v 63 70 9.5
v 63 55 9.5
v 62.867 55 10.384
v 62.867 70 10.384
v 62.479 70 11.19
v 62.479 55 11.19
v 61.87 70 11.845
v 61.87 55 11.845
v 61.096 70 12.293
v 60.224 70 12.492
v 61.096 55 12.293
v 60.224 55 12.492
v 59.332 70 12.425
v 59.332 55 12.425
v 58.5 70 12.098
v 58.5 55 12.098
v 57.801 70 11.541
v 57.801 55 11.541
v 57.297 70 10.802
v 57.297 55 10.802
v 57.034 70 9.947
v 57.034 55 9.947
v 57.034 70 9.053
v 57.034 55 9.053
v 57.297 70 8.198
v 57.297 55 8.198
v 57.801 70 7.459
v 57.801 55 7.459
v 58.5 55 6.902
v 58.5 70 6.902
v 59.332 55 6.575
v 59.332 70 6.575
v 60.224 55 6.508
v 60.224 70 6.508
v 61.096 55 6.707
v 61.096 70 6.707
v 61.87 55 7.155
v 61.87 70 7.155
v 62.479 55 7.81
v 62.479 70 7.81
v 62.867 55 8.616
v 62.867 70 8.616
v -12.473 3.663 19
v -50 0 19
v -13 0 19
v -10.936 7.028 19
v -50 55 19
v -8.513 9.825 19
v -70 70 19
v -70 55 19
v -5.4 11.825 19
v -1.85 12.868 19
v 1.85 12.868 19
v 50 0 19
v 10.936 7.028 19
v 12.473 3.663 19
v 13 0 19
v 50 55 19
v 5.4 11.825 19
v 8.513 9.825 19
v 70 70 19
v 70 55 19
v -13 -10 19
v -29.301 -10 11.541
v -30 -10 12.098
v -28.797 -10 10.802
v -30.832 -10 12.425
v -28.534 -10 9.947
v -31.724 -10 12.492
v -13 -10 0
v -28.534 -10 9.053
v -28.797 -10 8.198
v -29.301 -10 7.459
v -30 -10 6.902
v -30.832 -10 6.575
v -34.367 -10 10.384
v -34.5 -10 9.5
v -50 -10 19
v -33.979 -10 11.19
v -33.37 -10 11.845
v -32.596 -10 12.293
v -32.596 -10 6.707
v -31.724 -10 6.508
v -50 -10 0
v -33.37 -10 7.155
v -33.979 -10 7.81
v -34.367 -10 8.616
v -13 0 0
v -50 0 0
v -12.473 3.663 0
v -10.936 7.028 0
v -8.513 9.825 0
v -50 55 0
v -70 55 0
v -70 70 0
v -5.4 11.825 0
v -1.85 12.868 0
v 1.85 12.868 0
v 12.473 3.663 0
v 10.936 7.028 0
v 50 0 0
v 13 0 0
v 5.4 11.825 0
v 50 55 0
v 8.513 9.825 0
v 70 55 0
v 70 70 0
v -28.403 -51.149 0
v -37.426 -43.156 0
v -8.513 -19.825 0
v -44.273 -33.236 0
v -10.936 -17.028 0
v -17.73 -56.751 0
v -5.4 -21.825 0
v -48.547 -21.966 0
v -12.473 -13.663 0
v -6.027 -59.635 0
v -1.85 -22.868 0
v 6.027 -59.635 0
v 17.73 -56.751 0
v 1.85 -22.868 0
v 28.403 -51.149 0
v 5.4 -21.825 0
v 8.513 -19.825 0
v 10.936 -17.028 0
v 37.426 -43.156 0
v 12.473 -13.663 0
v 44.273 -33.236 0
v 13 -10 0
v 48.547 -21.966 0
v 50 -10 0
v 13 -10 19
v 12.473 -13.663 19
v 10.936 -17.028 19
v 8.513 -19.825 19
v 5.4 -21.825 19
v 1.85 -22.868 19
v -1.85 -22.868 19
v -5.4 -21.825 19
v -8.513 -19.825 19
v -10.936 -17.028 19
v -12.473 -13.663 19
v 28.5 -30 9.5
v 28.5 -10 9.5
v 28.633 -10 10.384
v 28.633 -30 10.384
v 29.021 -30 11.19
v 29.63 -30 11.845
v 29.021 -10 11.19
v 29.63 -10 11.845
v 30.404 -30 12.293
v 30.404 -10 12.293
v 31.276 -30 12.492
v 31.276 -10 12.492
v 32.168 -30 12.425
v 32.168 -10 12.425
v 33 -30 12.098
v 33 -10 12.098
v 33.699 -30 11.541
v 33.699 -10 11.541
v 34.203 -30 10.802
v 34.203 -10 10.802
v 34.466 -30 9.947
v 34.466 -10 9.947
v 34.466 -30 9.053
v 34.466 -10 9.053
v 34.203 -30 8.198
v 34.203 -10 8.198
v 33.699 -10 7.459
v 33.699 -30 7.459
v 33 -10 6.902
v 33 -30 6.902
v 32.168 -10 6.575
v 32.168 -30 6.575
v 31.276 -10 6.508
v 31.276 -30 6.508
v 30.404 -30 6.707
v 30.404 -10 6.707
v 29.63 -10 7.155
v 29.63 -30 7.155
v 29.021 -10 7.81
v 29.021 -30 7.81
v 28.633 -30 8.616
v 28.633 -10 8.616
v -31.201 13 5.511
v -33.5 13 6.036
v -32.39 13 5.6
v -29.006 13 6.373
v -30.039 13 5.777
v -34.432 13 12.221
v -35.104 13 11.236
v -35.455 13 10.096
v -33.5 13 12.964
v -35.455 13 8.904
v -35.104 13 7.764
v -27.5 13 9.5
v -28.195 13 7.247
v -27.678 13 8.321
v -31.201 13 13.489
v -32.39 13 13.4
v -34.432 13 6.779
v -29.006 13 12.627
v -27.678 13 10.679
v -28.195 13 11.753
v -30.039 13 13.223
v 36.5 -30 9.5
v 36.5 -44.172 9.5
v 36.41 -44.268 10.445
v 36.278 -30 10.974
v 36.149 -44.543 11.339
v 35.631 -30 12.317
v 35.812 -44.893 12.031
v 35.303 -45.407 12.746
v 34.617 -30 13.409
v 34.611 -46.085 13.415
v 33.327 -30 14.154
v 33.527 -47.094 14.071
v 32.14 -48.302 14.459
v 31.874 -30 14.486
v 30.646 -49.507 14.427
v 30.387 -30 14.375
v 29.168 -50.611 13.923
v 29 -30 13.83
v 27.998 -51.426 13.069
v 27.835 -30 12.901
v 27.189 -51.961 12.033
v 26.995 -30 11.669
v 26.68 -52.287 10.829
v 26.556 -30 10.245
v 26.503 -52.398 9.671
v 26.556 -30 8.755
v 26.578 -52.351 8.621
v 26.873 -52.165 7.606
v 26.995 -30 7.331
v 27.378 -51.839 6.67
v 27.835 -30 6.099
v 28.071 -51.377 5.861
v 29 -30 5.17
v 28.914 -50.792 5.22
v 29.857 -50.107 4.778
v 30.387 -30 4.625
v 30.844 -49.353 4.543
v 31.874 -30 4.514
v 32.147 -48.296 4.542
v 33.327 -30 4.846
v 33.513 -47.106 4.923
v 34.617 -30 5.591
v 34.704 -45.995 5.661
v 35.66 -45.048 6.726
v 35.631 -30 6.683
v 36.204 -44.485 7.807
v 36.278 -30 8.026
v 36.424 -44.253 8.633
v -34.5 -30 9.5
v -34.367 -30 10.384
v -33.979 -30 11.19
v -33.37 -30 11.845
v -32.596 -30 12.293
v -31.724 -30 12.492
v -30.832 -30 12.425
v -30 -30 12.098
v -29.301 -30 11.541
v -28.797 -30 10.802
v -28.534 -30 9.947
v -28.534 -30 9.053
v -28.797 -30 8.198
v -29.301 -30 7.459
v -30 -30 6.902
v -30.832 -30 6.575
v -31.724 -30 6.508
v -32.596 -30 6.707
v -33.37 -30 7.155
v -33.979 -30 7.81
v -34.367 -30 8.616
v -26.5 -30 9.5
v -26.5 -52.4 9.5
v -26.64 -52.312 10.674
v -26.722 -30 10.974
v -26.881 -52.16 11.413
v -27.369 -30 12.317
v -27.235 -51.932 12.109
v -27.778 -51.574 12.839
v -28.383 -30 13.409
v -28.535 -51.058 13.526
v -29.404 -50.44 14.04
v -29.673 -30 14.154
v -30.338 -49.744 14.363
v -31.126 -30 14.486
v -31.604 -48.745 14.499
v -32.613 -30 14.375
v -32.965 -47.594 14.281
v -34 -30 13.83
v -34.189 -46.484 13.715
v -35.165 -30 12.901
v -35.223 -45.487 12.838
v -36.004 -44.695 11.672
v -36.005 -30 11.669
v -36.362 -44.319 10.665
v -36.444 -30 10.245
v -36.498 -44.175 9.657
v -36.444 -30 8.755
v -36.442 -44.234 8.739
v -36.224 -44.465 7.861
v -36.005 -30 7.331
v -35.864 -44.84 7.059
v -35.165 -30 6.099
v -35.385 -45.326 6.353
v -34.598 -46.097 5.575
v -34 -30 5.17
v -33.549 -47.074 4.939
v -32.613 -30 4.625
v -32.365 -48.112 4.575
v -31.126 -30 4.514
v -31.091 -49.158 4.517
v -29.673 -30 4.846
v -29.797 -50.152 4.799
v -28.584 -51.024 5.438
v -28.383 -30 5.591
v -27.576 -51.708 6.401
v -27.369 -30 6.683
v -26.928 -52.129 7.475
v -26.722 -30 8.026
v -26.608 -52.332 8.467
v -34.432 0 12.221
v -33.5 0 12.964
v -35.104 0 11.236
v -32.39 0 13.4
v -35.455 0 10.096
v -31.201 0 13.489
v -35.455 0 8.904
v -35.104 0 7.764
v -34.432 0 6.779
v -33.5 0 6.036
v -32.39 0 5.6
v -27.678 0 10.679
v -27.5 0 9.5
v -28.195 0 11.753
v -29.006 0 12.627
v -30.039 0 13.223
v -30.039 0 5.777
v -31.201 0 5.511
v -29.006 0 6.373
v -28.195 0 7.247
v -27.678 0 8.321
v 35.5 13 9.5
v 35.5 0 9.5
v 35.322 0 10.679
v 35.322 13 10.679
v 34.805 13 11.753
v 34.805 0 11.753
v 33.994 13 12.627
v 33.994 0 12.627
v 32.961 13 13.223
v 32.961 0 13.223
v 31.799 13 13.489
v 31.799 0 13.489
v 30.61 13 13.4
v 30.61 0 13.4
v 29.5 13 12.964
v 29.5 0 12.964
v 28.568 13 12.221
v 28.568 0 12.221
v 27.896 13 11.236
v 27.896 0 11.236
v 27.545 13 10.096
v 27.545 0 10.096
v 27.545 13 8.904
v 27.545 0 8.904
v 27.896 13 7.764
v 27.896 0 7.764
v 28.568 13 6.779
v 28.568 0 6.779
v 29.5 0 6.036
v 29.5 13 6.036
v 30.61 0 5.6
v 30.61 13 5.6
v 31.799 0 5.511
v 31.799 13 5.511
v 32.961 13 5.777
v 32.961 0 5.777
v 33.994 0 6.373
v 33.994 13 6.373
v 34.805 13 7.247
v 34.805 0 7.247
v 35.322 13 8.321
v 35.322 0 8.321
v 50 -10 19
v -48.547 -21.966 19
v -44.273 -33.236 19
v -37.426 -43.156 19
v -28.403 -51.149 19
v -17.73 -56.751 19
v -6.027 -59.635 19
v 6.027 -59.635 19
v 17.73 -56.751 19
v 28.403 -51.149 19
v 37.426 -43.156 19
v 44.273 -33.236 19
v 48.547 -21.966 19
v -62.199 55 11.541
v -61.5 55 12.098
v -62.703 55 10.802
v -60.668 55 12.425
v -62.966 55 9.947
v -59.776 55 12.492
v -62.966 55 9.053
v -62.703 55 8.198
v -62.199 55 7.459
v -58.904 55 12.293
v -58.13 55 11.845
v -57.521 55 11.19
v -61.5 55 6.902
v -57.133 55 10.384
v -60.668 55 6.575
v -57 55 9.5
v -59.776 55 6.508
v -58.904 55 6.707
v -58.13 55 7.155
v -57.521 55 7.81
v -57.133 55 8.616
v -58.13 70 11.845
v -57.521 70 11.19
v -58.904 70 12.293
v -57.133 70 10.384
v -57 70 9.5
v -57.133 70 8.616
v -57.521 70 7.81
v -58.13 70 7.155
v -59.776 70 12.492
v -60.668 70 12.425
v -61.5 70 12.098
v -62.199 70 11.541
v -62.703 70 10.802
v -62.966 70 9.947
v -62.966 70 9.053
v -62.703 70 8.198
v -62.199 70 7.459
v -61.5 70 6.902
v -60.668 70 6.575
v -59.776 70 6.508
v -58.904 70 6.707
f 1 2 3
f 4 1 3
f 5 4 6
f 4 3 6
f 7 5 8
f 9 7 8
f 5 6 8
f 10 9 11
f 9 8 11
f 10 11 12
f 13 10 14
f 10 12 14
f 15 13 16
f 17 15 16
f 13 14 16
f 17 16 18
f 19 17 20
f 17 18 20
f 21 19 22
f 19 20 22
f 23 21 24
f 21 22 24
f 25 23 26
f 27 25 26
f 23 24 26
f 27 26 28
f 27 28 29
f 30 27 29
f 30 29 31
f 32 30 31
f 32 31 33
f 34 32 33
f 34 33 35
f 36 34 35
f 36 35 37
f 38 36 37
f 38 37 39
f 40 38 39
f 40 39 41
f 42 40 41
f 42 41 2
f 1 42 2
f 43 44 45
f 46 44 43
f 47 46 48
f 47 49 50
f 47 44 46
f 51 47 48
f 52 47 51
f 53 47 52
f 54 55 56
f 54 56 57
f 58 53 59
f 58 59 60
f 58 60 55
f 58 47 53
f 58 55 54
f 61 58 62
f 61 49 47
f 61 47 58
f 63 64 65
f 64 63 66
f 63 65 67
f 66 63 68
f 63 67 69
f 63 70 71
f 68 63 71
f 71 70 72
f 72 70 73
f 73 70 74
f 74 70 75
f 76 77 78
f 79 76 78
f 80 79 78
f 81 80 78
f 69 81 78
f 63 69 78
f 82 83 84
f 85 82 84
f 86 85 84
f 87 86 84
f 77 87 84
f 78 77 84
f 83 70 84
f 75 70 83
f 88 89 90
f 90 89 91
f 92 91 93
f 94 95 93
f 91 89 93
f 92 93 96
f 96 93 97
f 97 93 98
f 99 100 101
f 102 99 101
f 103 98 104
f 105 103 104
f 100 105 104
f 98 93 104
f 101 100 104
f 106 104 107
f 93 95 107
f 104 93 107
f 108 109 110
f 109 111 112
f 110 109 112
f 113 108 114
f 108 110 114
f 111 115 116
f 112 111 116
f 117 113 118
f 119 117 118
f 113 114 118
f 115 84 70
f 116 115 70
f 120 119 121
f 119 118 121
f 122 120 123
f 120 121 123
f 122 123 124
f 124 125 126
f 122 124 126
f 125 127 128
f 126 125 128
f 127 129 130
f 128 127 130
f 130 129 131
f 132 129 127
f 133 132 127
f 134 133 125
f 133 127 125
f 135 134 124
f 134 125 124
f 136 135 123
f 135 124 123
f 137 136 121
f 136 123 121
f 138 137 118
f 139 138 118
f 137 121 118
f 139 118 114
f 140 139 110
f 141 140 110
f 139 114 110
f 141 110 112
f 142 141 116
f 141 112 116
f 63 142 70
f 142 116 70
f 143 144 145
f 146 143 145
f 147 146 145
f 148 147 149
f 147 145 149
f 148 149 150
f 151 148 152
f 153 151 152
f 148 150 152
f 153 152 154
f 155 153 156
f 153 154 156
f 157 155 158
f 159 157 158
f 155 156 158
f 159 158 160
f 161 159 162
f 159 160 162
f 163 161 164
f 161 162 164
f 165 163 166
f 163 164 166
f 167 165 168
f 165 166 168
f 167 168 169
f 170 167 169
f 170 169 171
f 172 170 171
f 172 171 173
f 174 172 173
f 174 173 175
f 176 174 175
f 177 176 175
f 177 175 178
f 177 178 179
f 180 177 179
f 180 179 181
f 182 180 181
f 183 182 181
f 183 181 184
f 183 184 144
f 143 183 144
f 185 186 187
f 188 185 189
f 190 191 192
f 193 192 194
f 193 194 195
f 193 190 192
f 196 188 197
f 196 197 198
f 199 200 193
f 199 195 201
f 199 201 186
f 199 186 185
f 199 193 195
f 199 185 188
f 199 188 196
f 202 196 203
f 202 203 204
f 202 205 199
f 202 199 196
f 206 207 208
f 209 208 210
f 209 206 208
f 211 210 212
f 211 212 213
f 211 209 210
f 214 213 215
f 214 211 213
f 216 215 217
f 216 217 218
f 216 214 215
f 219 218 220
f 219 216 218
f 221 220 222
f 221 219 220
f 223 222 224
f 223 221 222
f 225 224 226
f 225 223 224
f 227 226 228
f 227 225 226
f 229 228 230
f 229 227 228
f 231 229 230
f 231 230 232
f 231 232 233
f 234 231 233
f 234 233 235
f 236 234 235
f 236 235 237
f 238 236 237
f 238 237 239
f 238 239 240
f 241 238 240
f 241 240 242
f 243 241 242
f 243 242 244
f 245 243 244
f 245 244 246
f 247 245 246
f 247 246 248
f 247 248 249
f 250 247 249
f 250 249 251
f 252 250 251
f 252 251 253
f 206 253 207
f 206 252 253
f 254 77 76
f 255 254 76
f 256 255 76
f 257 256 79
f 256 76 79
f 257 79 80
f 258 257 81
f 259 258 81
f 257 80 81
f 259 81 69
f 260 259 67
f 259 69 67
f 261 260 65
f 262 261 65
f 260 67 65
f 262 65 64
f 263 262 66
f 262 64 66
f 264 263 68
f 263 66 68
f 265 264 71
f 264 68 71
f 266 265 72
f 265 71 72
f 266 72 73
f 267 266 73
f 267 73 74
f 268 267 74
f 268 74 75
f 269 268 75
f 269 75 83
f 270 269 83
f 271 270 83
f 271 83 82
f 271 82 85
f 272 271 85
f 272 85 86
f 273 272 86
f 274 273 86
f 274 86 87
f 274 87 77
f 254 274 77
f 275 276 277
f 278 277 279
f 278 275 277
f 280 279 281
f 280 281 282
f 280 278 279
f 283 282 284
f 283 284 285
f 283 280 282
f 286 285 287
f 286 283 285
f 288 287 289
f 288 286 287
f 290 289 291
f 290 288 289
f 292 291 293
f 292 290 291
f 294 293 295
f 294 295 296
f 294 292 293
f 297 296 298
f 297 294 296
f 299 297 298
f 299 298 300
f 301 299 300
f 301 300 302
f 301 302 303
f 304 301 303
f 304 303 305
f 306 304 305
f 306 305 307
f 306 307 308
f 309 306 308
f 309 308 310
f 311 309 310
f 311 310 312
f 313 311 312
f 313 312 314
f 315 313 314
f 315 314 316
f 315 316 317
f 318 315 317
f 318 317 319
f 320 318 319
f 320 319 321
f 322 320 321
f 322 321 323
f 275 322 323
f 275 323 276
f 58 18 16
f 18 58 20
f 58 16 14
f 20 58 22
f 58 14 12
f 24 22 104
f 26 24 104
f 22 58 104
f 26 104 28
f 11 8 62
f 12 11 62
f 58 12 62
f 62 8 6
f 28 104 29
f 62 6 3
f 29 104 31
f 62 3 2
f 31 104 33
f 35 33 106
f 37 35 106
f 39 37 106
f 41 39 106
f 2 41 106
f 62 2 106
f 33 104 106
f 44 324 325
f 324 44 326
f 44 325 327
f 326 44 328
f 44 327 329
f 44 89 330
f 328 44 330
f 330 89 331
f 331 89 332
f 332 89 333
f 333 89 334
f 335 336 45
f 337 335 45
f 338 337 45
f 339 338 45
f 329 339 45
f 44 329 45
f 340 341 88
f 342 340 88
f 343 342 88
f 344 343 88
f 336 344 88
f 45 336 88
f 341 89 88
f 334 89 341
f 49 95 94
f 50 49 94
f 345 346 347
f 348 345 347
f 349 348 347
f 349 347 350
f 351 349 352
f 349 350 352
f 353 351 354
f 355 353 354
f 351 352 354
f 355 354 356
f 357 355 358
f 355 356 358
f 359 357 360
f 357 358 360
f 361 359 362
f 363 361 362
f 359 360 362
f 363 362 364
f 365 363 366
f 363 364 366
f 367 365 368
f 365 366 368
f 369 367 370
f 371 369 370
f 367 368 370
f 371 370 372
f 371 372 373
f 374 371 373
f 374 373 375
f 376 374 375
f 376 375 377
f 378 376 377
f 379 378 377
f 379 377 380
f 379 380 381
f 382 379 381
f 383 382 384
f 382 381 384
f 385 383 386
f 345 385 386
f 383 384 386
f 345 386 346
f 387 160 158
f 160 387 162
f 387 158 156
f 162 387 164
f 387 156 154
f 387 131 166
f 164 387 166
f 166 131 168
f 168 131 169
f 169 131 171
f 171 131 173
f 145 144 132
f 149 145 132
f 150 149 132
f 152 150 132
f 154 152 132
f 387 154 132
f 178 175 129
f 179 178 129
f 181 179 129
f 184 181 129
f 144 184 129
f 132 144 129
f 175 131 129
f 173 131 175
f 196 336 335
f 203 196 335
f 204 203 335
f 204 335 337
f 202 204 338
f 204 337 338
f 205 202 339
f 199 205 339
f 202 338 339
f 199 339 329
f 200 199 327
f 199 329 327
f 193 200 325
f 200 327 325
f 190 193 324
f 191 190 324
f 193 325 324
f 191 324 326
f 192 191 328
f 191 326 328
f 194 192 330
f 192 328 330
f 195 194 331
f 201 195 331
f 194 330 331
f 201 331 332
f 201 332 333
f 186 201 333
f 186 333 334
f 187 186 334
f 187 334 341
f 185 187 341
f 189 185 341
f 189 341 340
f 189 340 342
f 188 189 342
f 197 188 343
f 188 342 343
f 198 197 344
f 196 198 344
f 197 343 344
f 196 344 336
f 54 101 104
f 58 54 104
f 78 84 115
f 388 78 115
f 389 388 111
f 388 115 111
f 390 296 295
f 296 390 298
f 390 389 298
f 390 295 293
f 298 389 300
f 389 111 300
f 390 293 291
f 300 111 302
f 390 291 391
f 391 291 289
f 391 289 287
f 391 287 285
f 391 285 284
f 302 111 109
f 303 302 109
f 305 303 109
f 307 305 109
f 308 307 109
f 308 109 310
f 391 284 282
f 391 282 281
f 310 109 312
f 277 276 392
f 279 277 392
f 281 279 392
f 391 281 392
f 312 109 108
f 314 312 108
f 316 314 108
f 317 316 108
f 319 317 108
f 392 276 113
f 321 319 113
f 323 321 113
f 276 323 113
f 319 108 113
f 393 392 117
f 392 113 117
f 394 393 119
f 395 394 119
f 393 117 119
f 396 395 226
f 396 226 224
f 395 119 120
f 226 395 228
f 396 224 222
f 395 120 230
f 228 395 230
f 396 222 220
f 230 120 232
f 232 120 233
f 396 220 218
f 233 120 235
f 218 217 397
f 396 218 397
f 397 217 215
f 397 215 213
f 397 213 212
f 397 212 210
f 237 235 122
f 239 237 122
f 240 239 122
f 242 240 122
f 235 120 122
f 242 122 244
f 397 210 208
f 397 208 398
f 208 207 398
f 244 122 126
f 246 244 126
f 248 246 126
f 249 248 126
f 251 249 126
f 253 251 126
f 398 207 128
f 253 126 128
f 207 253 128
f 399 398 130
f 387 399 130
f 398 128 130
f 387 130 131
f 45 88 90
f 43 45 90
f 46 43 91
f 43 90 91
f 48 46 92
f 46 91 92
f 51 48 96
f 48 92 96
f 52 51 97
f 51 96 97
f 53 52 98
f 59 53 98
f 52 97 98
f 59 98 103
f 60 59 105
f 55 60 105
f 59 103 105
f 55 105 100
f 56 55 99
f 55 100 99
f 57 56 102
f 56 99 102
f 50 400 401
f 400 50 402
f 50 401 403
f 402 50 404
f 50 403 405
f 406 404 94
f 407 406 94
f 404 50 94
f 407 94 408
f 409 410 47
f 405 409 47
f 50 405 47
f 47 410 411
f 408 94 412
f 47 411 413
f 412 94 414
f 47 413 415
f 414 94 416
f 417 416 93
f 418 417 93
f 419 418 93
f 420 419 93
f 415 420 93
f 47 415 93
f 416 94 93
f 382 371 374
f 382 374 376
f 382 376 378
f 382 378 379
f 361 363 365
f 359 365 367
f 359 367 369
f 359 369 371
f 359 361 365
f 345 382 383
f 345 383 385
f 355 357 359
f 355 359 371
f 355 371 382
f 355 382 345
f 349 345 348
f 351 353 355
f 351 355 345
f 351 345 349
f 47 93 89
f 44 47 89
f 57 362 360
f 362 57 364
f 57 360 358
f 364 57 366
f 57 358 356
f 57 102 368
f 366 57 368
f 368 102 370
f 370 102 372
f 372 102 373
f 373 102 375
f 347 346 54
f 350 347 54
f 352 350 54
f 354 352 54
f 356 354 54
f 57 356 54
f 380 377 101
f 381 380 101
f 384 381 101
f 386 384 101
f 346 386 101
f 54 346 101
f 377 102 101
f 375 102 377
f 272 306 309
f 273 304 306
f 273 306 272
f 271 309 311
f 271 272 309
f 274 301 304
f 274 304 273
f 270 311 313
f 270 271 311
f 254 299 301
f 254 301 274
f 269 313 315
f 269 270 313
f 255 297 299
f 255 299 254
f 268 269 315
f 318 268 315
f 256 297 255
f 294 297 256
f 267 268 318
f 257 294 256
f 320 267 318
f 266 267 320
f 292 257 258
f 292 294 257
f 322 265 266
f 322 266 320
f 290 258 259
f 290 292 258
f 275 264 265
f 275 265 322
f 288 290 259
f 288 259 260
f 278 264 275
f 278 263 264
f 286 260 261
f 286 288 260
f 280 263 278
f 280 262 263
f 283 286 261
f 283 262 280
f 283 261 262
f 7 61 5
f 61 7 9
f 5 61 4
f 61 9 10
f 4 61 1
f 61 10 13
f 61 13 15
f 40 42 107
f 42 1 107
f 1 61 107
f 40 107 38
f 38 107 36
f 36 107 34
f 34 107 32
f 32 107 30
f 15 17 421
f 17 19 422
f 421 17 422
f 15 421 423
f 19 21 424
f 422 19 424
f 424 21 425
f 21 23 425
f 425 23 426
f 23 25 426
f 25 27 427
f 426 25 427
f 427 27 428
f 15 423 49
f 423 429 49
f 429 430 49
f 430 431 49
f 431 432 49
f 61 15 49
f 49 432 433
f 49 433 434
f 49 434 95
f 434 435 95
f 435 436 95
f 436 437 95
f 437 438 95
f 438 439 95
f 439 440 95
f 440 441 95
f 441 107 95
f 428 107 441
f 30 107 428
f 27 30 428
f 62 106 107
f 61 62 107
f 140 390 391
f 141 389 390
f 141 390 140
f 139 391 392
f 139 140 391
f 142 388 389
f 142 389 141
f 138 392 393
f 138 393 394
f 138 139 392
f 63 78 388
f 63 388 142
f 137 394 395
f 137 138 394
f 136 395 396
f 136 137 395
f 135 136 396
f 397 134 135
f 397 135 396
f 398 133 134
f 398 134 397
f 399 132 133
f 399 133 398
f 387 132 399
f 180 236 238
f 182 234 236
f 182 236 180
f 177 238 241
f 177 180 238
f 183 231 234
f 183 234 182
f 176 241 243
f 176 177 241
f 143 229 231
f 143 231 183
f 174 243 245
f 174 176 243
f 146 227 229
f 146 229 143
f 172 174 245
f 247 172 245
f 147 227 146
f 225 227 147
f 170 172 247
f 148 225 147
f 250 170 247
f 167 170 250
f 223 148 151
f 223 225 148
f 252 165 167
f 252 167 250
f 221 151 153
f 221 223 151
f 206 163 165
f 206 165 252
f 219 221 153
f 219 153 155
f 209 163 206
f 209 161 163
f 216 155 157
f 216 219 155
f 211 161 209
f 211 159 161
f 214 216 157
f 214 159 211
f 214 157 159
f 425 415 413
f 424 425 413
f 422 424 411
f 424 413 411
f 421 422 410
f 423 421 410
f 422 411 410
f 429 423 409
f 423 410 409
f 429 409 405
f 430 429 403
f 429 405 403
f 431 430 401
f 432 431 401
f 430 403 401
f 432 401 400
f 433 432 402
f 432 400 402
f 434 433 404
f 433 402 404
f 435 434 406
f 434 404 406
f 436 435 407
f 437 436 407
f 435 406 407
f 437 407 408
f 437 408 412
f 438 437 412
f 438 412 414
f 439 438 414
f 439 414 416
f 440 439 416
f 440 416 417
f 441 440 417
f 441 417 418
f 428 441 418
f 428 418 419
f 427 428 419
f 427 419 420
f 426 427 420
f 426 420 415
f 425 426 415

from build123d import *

# Parameters (mm, degrees)
F1_DEPTH  = 19
F2_R      = 4
F3_DEPTH  = 13
F4_R      = 3
F5_DEPTH  = 25
F6_R      = 3
F7_DEPTH  = 42
F9_R      = 5
F10_DEPTH = 25


with BuildPart() as f1:
    # F0 (on Top) → F1 (new body)
    with BuildSketch(Plane.XY):
        with BuildLine():
            ThreePointArc((-13, 0), (0, 13), (13, 0))
            Line((13, 0), (50, 0))
            Line((50, 0), (50, 55))
            Line((50, 55), (70, 55))
            Line((70, 55), (70, 70))
            Line((70, 70), (-70, 70))
            Line((-70, 70), (-70, 55))
            Line((-70, 55), (-50, 55))
            Line((-50, 55), (-50, 0))
            Line((-50, 0), (-13, 0))
        make_face()
        with BuildLine():
            Line((-13, -10), (-50, -10))
            ThreePointArc((-50, -10), (0, -60), (50, -10))
            Line((50, -10), (13, -10))
            ThreePointArc((13, -10), (0, -23), (-13, -10))
        make_face()
    extrude(amount=F1_DEPTH)

    # F2 (on face) → F3 (cut)
    with BuildSketch(Plane.XZ):
        with Locations((-31.5, 9.5)):
            Circle(F2_R)
        with Locations((31.5, 9.5)):
            Circle(F2_R)
    extrude(amount=-F3_DEPTH, mode=Mode.SUBTRACT)

    # F4 (on face) → F5 (cut)
    with BuildSketch(Plane.XZ.offset(-55)):
        with Locations((-60, 9.5)):
            Circle(F4_R)
        with Locations((60, 9.5)):
            Circle(F4_R)
    extrude(amount=-F5_DEPTH, mode=Mode.SUBTRACT)

    # F6 (on face) → F7 (cut)
    with BuildSketch(Plane(origin=(0, -10, 0), x_dir=(-1, 0, 0), z_dir=(0, 1, 0))):
        with Locations((-31.5, 9.5)):
            Circle(F6_R)
        with Locations((31.5, 9.5)):
            Circle(F6_R)
    extrude(amount=-F7_DEPTH, mode=Mode.SUBTRACT)

    # F9 (on offset) → F10 (cut)
    with BuildSketch(Plane.XZ.offset(30)):
        with Locations((-31.5, 9.5)):
            Circle(F9_R)
        with Locations((31.5, 9.5)):
            Circle(F9_R)
    extrude(amount=F10_DEPTH, mode=Mode.SUBTRACT)


solid = f1.part
